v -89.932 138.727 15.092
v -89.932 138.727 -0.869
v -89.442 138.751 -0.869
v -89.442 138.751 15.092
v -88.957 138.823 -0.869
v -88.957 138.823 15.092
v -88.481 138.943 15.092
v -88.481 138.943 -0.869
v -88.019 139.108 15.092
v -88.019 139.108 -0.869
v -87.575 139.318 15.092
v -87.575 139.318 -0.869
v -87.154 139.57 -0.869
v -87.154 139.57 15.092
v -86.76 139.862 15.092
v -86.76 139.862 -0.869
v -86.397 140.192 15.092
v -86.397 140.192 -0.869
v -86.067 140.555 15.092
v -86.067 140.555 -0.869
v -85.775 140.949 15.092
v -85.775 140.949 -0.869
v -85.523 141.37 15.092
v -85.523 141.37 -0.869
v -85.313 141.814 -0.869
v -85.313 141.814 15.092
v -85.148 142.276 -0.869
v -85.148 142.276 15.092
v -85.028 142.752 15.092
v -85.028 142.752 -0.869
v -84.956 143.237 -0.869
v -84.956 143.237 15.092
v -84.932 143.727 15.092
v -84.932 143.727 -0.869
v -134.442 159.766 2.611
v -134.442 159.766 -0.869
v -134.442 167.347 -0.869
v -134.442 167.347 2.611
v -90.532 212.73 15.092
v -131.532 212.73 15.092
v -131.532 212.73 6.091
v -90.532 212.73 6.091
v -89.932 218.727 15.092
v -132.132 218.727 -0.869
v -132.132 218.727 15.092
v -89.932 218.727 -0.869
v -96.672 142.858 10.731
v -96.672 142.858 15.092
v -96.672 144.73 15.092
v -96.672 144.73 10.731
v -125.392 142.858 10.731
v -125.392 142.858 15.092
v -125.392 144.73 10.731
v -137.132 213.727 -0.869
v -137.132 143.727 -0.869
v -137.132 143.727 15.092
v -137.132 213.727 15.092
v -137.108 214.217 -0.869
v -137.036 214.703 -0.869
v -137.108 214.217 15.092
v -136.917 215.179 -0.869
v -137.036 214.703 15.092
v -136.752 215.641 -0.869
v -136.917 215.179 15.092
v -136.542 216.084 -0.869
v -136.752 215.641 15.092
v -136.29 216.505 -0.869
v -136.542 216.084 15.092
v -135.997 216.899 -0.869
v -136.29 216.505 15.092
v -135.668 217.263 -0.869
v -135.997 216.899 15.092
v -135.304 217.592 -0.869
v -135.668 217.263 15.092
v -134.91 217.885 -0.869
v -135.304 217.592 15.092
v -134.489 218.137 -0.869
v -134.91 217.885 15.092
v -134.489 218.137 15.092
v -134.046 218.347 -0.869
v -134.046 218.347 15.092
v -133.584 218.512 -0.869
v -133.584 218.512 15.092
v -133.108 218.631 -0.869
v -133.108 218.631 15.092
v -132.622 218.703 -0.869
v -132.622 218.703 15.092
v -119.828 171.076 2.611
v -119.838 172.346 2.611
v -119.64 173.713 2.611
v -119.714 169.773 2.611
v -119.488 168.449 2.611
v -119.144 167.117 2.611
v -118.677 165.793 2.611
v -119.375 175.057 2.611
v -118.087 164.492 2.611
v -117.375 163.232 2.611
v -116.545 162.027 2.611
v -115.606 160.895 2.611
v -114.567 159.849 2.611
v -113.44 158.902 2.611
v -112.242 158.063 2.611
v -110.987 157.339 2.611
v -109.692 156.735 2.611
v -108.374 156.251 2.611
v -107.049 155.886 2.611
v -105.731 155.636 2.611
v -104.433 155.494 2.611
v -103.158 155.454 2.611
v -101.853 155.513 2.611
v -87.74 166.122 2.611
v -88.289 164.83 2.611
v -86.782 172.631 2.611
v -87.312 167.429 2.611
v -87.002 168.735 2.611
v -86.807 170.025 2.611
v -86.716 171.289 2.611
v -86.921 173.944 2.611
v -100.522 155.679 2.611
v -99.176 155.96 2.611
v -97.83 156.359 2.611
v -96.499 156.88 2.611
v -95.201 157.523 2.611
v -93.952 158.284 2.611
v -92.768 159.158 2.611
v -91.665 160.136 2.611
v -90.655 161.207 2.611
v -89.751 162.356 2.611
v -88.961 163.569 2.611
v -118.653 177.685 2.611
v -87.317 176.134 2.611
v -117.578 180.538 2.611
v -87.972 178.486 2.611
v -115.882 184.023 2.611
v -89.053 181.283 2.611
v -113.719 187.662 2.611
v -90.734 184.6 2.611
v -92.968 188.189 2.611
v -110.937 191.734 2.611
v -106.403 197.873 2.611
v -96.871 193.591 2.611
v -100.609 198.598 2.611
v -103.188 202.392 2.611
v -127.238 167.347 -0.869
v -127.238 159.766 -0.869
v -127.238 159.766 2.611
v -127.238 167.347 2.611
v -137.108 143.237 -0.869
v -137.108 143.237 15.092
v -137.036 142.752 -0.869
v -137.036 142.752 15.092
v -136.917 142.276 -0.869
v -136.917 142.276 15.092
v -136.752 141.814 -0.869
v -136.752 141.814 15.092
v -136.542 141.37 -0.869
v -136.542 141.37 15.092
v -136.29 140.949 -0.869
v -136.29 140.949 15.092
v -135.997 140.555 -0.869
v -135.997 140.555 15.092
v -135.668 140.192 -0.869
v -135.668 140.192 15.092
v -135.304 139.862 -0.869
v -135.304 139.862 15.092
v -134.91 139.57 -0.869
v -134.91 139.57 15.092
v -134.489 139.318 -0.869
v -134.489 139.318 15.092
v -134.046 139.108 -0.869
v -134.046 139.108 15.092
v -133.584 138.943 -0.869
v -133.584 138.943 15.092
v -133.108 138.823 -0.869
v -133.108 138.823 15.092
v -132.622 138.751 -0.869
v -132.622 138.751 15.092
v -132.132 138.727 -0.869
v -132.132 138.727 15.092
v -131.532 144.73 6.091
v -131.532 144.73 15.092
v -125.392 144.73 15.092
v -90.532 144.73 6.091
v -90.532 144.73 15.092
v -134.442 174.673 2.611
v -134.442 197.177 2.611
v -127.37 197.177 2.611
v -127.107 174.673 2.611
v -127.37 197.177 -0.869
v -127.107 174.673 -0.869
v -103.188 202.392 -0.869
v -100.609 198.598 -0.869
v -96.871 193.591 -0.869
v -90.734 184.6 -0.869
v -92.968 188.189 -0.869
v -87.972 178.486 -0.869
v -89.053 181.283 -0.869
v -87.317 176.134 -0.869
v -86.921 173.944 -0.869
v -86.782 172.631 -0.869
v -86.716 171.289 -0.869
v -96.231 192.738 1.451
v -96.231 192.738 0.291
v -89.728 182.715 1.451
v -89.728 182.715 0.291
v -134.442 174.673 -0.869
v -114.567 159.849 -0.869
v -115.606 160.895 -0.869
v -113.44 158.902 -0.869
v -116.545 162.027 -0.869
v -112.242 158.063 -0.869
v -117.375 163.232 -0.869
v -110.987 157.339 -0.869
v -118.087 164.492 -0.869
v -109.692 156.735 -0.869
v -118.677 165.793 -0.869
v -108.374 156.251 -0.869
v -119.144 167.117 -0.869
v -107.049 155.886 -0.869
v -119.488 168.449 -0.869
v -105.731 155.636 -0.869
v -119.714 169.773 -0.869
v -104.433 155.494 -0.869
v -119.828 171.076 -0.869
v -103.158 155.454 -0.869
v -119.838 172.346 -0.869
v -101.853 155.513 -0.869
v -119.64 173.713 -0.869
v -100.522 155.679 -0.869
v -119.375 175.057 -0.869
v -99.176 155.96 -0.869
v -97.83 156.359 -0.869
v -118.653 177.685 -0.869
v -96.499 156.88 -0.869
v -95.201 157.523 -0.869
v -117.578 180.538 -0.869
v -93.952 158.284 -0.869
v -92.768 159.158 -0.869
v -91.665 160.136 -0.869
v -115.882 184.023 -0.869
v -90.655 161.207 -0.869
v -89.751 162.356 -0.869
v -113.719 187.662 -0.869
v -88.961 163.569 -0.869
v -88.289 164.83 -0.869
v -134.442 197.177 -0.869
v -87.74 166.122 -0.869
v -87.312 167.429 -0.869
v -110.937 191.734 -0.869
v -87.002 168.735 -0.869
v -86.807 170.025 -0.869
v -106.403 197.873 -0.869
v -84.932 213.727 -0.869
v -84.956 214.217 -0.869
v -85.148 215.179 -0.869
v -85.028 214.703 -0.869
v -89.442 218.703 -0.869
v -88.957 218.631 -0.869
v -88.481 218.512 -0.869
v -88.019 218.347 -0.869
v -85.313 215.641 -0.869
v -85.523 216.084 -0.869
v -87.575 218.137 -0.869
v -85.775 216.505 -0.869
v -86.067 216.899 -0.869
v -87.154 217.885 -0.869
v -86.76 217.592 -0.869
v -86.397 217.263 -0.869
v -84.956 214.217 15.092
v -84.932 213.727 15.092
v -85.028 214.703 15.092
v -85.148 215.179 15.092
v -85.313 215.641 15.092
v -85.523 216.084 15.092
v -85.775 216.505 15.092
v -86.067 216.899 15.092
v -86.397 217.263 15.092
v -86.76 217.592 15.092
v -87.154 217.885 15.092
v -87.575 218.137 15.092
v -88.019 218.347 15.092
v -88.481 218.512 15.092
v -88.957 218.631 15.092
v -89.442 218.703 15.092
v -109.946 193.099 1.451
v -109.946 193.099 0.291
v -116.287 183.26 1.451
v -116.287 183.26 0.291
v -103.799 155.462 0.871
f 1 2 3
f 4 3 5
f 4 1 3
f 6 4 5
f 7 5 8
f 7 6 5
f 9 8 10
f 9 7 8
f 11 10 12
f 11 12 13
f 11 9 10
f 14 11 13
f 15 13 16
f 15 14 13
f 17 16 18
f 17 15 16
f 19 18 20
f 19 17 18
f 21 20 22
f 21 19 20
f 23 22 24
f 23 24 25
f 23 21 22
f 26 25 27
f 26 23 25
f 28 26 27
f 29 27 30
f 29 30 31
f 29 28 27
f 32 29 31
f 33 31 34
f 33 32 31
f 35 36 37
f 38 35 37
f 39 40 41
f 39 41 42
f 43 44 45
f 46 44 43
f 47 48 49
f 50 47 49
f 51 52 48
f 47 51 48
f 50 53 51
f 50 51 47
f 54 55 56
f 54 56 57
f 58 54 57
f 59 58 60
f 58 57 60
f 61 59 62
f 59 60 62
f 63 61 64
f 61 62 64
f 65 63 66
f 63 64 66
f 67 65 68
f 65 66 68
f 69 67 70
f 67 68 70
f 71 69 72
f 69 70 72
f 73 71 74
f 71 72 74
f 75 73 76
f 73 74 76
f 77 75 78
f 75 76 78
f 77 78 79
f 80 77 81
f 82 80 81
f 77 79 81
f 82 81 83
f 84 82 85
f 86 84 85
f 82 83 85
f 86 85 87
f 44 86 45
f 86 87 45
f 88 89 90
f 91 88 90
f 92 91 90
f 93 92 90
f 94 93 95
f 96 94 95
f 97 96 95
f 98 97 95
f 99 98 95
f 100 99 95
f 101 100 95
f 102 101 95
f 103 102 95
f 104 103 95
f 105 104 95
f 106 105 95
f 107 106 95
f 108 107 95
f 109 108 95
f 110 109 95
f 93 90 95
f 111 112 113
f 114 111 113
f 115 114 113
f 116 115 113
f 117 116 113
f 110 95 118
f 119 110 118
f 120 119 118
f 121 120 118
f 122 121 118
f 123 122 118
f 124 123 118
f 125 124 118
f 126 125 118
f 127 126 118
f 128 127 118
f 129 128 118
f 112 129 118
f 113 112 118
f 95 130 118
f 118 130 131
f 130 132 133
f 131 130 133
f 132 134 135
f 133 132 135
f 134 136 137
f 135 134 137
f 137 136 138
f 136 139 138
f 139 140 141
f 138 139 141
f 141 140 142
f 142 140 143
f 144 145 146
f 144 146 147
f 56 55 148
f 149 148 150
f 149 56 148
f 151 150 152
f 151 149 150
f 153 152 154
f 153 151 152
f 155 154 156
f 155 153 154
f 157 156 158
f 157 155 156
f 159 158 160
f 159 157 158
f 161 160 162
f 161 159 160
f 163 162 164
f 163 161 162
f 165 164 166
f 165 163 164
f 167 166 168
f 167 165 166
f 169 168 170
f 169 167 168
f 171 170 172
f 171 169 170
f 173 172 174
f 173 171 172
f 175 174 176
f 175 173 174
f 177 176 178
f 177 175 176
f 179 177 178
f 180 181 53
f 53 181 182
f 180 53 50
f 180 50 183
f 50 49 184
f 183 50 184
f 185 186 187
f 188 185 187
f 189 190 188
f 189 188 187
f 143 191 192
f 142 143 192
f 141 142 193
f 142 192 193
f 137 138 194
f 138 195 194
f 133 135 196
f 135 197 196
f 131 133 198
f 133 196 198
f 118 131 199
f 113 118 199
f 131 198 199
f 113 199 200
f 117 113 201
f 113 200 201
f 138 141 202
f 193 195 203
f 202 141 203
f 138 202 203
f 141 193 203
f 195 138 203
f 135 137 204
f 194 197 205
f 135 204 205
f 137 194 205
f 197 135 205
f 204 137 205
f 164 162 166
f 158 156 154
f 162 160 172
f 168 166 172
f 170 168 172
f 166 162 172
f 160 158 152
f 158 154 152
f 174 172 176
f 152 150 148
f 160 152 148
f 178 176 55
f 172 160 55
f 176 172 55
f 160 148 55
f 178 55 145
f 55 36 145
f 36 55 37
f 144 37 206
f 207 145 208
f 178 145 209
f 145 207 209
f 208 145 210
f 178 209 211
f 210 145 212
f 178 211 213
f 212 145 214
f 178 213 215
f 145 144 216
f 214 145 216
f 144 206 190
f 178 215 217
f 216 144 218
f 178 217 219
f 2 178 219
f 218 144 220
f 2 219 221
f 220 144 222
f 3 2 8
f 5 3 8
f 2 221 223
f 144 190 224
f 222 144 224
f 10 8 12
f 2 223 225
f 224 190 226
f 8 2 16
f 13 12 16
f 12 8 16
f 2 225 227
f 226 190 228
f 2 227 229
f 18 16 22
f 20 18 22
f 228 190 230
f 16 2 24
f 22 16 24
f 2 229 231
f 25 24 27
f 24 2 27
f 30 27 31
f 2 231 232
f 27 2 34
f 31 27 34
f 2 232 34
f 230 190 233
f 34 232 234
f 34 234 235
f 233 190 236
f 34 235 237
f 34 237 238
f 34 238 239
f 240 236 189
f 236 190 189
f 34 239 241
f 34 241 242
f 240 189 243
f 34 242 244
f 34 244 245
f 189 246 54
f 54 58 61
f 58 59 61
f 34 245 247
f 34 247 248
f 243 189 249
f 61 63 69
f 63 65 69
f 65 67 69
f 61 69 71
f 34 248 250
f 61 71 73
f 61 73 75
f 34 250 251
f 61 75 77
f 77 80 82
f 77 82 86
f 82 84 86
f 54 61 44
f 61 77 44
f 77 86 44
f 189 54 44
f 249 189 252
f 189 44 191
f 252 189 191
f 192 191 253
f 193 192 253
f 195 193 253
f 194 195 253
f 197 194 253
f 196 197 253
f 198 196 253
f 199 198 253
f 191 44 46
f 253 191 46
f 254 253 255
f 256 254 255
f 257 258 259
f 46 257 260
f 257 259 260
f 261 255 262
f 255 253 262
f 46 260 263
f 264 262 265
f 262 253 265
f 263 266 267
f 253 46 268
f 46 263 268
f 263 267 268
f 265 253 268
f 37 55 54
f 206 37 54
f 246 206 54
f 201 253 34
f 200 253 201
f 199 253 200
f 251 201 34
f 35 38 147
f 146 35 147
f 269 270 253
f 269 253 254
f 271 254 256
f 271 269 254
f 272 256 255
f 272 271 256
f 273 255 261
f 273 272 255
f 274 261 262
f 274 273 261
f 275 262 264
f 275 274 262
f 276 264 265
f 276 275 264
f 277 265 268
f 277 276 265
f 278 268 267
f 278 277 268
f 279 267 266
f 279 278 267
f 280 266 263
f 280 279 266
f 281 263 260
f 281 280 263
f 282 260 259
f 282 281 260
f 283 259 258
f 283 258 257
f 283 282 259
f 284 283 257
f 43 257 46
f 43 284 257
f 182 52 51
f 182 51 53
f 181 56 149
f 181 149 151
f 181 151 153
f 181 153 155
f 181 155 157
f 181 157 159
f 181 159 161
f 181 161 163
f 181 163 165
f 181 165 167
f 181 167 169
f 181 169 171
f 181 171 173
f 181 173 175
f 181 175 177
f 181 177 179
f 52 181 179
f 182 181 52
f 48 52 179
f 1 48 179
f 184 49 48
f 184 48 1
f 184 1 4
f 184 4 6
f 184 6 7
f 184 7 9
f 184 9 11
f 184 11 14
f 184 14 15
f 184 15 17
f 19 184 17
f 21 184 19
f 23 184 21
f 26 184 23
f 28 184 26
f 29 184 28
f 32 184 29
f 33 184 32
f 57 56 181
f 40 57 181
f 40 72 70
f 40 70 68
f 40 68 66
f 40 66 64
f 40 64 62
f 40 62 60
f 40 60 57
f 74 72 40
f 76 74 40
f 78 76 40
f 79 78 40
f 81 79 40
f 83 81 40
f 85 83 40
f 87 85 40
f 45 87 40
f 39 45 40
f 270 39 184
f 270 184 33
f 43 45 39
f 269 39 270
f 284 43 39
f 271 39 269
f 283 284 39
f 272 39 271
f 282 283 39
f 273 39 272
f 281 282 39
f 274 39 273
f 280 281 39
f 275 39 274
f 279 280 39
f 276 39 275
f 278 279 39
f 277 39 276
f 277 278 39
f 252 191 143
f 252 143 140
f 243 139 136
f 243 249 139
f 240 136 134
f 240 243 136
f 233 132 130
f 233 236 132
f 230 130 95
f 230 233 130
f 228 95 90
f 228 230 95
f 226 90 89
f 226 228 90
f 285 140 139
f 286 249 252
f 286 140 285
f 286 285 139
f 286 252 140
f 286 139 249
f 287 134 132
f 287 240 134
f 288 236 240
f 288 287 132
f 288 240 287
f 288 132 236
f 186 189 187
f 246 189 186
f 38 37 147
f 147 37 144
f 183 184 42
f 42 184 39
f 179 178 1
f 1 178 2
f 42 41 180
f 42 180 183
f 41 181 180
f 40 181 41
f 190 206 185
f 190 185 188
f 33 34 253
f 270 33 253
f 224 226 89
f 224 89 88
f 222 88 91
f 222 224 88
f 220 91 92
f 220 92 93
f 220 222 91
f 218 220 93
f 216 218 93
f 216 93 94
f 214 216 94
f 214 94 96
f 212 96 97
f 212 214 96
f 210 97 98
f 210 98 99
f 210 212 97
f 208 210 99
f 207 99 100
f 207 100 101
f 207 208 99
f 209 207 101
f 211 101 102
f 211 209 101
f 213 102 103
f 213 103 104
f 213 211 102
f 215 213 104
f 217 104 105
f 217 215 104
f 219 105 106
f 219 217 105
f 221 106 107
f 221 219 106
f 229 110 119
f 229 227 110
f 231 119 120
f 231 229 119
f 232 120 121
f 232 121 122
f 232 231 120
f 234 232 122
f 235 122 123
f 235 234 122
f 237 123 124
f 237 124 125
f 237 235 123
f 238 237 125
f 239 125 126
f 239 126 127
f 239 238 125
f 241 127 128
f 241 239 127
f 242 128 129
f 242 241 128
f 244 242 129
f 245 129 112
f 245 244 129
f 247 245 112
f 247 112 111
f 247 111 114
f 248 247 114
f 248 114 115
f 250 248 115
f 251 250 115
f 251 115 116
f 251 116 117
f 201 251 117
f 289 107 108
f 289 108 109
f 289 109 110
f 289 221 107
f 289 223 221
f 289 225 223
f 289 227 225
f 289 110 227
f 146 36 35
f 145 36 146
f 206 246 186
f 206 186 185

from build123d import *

# Parameters (mm, degrees)
ESQUISSE4_W              = 45
ESQUISSE4_H              = 68.965517242
BOSS_EXTRU_2_DEPTH       = 20
CONG_6_R                 = 4.310344828
ESQUISSE9_W              = 35.344827586
ESQUISSE9_H              = 58.620689655
ENL_V_MAT_EXTRU_7_DEPTH  = 14
ESQUISSE10_W             = 24.75862069
ESQUISSE10_H             = 1.613627587
ENL_V_MAT_EXTRU_8_DEPTH  = 10
ESQUISSE12_W             = 45
ESQUISSE12_H             = 68.965517242
ENL_V_MAT_EXTRU_11_DEPTH = 6.24
ESQUISSE14_W             = 6.210038645
ESQUISSE14_H             = 6.535729399
ENL_V_MAT_EXTRU_15_DEPTH = 3
ECHELLE2_SCALE           = 1.16


with BuildPart() as part:
    # Esquisse4 → Boss.-Extru.2 (new body)
    with BuildSketch(Plane.XY):
        with Locations((-111.0819834, 178.800149876)):
            Rectangle(ESQUISSE4_W, ESQUISSE4_H)
    extrude(amount=BOSS_EXTRU_2_DEPTH)

    # Congé6
    cong_6_edges = [part.edges().sort_by_distance(p)[0] for p in [
        (-133.5819834, 213.282908497, 10),
        (-88.5819834, 213.282908497, 10),
        (-88.5819834, 144.317391255, 10),
        (-133.5819834, 144.317391255, 10),
    ]]
    fillet(cong_6_edges, radius=CONG_6_R)

    # Esquisse9 → Enlèv. mat.-Extru.7 (cut)
    with BuildSketch(Plane.XY.offset(20)):
        with Locations((-111.081983607, 178.802563669)):
            Rectangle(ESQUISSE9_W, ESQUISSE9_H)
    extrude(amount=-ENL_V_MAT_EXTRU_7_DEPTH, mode=Mode.SUBTRACT)

    # Esquisse10 → Enlèv. mat.-Extru.8 (cut)
    with BuildSketch(Plane.XY.offset(20)):
        with Locations((-111.081983607, 148.685405049)):
            Rectangle(ESQUISSE10_W, ESQUISSE10_H)
    extrude(amount=-ENL_V_MAT_EXTRU_8_DEPTH, mode=Mode.SUBTRACT)

    # Esquisse12 → Enlèv. mat.-Extru.11 (cut)
    with BuildSketch(Plane.XY.offset(20)):
        with Locations((-111.0819834, 178.800149876)):
            Rectangle(ESQUISSE12_W, ESQUISSE12_H)
    extrude(amount=-ENL_V_MAT_EXTRU_11_DEPTH, mode=Mode.SUBTRACT)

    # Esquisse14 → Enlèv. mat.-Extru.15 (cut)
    with BuildSketch(Plane.XY):
        with Locations((-128.157742359, 165.722037811)):
            Rectangle(ESQUISSE14_W, ESQUISSE14_H)
        Polygon((-125.166077697, 194.70473497), (-131.262761681, 194.70473497), (-131.262761681, 175.305285642), (-124.939368374, 175.305285642), align=None)
        with BuildLine():
            add(Edge.make_bspline(
                [(-118.672815137, 173.299083951), (-119.122606069, 159.199358702), (-104.846253159, 158.743933226), (-90.56990025, 158.28850775), (-90.120109318, 172.388233)],
                knots=[0, 0, 0, 1.570796327, 1.570796327, 3.141592654, 3.141592654, 3.141592654], degree=2, weights=[1, 0.707106781, 1, 0.707106781, 1]))
            add(Edge.make_bspline(
                [(-104.31929668, 199.200388229), (-98.998777501, 190.741931467), (-90.339178369, 183.138148549), (-90.120109318, 172.388233)],
                knots=[0, 0, 0, 0, 1, 1, 1, 1], degree=3))
            add(Edge.make_bspline(
                [(-104.31929668, 199.200388229), (-109.644635947, 191.271995555), (-117.49611417, 183.324353593), (-118.672815137, 173.299083951)],
                knots=[0, 0, 0, 0, 1, 1, 1, 1], degree=3))
        make_face()
    extrude(amount=ENL_V_MAT_EXTRU_15_DEPTH, mode=Mode.SUBTRACT)


with BuildPart() as part_1:
    # Echelle2: scaled about (-111.392758629, 179.255556227, 5.432678967)
    add(part.part.scale(ECHELLE2_SCALE).moved(Location((17.822841381, -28.680888996, -0.869228635))))


solid = part_1.part
